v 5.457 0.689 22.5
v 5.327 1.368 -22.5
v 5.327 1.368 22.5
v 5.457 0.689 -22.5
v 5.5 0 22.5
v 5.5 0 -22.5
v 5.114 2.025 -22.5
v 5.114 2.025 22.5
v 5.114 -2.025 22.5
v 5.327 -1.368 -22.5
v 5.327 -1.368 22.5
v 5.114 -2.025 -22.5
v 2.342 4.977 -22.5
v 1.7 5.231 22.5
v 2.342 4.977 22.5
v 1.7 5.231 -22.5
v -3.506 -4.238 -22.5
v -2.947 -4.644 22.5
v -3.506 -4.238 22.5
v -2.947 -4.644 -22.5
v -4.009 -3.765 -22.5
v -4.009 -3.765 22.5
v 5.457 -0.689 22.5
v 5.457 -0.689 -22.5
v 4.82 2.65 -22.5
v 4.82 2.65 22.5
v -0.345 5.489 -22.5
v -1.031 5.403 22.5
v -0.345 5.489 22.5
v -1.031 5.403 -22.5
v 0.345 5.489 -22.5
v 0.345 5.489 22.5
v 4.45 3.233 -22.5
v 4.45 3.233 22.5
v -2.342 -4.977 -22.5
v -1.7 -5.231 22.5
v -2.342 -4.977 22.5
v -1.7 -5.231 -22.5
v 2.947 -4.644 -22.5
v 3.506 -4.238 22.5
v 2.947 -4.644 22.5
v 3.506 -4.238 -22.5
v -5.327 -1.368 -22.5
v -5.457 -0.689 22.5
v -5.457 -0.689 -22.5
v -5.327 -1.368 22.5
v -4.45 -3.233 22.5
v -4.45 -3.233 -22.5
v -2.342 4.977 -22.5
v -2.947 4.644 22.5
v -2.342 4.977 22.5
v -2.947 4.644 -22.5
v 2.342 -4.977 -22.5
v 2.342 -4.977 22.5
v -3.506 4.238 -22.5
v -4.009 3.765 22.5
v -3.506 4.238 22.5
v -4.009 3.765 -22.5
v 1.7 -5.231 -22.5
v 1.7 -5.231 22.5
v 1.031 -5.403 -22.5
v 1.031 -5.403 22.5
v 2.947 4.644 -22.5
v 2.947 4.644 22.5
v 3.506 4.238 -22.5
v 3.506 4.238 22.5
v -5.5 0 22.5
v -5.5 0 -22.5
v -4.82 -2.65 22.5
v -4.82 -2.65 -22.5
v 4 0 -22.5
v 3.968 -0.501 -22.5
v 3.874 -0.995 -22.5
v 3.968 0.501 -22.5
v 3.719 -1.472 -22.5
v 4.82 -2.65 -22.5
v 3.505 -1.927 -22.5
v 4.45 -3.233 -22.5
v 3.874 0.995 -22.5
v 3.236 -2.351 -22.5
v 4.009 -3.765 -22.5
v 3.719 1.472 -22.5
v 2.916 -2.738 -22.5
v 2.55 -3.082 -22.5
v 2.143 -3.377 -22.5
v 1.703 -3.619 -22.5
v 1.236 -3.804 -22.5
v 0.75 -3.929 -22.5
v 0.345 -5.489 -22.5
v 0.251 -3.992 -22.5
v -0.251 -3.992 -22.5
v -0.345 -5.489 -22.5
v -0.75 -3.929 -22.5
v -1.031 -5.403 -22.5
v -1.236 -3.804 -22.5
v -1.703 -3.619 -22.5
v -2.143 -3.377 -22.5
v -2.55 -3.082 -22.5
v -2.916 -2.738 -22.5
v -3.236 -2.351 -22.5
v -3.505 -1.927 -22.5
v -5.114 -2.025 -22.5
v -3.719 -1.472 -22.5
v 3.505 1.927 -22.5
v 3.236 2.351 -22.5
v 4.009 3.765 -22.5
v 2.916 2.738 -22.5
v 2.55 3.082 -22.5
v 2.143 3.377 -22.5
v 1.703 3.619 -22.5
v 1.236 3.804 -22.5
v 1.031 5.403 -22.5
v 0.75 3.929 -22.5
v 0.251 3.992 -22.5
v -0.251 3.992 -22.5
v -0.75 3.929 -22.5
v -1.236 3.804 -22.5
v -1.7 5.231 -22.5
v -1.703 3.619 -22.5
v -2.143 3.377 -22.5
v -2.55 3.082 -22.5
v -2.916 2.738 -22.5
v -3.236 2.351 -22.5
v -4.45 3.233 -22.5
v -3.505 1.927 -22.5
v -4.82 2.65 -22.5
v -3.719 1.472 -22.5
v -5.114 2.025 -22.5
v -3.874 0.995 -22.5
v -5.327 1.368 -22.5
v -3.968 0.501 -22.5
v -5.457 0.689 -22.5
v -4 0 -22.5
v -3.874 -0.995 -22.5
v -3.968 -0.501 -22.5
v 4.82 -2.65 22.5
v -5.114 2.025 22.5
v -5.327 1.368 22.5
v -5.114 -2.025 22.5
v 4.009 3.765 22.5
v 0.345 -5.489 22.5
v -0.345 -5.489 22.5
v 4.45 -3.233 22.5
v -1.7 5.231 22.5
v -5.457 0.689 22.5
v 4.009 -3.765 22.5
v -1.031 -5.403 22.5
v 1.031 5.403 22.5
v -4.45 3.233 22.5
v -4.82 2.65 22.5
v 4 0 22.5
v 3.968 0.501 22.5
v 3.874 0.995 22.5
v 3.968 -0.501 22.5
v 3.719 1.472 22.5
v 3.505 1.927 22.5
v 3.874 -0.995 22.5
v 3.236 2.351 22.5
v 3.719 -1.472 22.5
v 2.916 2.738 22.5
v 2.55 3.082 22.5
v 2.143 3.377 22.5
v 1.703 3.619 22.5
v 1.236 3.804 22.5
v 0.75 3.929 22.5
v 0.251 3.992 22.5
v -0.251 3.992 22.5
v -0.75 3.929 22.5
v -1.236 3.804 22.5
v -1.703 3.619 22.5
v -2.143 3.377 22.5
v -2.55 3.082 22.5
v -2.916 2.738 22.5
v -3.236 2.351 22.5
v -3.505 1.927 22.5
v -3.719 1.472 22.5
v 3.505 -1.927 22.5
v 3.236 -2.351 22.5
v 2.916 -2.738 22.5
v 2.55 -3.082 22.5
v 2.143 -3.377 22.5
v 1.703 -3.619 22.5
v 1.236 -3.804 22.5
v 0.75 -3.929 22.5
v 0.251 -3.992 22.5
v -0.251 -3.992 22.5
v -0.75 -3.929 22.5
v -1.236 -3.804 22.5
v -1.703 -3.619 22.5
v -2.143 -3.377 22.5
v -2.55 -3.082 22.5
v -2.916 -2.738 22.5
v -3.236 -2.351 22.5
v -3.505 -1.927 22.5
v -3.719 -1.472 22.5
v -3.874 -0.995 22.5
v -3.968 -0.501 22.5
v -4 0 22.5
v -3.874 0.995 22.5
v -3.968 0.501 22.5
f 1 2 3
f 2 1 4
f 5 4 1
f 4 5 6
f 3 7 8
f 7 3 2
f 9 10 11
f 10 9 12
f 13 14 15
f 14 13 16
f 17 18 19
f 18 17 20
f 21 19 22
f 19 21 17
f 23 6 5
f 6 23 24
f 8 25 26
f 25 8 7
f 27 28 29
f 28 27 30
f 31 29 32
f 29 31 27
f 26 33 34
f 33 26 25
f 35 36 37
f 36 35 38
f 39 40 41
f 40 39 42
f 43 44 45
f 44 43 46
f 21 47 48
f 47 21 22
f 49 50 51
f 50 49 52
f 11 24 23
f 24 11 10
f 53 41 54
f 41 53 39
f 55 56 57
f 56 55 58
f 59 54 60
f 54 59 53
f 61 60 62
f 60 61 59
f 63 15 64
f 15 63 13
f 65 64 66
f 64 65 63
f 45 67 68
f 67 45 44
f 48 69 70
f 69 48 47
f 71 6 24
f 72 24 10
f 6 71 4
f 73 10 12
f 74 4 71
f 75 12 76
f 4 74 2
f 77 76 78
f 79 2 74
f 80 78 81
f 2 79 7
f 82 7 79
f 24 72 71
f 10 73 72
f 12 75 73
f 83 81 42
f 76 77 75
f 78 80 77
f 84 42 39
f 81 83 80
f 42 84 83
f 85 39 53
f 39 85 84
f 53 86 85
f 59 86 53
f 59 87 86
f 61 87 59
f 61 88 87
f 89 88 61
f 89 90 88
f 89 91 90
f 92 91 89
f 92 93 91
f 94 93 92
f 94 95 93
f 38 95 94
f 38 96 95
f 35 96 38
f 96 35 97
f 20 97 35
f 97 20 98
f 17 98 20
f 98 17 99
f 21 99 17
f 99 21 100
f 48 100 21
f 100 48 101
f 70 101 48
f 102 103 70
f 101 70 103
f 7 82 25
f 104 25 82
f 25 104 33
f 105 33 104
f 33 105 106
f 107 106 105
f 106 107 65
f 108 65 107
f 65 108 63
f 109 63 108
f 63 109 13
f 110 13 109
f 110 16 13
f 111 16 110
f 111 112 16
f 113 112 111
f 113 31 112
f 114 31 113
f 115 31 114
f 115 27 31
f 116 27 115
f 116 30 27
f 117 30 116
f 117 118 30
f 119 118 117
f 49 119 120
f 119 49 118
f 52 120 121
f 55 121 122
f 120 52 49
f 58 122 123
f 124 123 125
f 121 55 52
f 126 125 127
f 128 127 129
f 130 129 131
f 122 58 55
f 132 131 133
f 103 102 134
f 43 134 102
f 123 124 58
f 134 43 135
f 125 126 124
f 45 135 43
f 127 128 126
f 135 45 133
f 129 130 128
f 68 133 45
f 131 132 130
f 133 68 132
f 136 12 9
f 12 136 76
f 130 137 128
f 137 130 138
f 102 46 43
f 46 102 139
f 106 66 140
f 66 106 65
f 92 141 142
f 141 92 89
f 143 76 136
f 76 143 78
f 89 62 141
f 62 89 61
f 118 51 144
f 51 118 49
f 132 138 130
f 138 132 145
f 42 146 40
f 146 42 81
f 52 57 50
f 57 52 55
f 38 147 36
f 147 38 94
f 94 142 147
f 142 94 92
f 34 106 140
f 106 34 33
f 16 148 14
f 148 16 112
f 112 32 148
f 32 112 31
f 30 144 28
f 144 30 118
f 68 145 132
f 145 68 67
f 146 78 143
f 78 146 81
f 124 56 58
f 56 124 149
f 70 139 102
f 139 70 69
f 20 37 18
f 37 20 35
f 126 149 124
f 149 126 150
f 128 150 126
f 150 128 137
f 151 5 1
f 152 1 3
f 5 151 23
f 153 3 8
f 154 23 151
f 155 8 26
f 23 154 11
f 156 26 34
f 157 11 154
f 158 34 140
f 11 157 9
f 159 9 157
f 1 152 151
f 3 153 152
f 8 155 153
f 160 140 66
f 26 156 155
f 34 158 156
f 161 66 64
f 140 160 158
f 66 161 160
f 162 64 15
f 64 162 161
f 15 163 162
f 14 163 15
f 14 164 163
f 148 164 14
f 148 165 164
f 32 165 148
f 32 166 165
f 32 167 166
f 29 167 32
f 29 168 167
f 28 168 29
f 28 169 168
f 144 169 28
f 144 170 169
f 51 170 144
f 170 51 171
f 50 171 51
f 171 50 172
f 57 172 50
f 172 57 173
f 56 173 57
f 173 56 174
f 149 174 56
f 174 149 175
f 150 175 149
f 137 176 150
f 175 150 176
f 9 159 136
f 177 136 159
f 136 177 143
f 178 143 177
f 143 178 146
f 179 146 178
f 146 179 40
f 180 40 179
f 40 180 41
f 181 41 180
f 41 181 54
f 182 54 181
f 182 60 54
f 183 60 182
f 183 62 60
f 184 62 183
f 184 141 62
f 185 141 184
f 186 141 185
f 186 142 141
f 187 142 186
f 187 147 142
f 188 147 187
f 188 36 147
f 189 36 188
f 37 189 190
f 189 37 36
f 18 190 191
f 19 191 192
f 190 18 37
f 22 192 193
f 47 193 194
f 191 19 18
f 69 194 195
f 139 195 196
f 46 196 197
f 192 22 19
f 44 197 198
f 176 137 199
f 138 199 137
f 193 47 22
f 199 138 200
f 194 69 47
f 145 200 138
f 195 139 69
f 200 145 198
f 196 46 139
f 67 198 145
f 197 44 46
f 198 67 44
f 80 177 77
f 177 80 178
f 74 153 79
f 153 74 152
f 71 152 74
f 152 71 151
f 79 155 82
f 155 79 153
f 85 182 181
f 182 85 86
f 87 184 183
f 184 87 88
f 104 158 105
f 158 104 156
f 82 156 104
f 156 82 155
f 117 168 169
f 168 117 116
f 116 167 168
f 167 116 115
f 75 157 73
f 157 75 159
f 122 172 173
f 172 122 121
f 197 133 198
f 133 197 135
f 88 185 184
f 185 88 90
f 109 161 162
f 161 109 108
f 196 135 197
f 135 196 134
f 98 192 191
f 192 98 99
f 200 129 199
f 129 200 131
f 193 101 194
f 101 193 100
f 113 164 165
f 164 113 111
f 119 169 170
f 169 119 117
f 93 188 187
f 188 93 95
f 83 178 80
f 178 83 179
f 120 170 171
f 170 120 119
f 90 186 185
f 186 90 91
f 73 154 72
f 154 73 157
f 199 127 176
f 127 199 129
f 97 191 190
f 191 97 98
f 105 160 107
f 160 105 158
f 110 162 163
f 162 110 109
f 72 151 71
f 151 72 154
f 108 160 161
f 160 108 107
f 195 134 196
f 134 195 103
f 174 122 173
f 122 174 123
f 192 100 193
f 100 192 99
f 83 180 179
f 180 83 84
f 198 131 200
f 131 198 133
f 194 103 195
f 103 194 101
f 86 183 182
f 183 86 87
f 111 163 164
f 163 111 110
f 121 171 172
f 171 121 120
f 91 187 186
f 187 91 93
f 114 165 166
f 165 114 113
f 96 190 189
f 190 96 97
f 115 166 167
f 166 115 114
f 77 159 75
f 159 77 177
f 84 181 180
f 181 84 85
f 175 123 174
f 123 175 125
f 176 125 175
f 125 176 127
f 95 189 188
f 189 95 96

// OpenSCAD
$fn = 50;


difference() {
	union() {
		translate(v = [0, 0, -22.5000000000]) {
			cylinder(h = 45, r = 5.5000000000);
		}
	}
	union() {
		translate(v = [0, 0, -100.0000000000]) {
			cylinder(h = 200, r = 4.0000000000);
		}
	}
}
